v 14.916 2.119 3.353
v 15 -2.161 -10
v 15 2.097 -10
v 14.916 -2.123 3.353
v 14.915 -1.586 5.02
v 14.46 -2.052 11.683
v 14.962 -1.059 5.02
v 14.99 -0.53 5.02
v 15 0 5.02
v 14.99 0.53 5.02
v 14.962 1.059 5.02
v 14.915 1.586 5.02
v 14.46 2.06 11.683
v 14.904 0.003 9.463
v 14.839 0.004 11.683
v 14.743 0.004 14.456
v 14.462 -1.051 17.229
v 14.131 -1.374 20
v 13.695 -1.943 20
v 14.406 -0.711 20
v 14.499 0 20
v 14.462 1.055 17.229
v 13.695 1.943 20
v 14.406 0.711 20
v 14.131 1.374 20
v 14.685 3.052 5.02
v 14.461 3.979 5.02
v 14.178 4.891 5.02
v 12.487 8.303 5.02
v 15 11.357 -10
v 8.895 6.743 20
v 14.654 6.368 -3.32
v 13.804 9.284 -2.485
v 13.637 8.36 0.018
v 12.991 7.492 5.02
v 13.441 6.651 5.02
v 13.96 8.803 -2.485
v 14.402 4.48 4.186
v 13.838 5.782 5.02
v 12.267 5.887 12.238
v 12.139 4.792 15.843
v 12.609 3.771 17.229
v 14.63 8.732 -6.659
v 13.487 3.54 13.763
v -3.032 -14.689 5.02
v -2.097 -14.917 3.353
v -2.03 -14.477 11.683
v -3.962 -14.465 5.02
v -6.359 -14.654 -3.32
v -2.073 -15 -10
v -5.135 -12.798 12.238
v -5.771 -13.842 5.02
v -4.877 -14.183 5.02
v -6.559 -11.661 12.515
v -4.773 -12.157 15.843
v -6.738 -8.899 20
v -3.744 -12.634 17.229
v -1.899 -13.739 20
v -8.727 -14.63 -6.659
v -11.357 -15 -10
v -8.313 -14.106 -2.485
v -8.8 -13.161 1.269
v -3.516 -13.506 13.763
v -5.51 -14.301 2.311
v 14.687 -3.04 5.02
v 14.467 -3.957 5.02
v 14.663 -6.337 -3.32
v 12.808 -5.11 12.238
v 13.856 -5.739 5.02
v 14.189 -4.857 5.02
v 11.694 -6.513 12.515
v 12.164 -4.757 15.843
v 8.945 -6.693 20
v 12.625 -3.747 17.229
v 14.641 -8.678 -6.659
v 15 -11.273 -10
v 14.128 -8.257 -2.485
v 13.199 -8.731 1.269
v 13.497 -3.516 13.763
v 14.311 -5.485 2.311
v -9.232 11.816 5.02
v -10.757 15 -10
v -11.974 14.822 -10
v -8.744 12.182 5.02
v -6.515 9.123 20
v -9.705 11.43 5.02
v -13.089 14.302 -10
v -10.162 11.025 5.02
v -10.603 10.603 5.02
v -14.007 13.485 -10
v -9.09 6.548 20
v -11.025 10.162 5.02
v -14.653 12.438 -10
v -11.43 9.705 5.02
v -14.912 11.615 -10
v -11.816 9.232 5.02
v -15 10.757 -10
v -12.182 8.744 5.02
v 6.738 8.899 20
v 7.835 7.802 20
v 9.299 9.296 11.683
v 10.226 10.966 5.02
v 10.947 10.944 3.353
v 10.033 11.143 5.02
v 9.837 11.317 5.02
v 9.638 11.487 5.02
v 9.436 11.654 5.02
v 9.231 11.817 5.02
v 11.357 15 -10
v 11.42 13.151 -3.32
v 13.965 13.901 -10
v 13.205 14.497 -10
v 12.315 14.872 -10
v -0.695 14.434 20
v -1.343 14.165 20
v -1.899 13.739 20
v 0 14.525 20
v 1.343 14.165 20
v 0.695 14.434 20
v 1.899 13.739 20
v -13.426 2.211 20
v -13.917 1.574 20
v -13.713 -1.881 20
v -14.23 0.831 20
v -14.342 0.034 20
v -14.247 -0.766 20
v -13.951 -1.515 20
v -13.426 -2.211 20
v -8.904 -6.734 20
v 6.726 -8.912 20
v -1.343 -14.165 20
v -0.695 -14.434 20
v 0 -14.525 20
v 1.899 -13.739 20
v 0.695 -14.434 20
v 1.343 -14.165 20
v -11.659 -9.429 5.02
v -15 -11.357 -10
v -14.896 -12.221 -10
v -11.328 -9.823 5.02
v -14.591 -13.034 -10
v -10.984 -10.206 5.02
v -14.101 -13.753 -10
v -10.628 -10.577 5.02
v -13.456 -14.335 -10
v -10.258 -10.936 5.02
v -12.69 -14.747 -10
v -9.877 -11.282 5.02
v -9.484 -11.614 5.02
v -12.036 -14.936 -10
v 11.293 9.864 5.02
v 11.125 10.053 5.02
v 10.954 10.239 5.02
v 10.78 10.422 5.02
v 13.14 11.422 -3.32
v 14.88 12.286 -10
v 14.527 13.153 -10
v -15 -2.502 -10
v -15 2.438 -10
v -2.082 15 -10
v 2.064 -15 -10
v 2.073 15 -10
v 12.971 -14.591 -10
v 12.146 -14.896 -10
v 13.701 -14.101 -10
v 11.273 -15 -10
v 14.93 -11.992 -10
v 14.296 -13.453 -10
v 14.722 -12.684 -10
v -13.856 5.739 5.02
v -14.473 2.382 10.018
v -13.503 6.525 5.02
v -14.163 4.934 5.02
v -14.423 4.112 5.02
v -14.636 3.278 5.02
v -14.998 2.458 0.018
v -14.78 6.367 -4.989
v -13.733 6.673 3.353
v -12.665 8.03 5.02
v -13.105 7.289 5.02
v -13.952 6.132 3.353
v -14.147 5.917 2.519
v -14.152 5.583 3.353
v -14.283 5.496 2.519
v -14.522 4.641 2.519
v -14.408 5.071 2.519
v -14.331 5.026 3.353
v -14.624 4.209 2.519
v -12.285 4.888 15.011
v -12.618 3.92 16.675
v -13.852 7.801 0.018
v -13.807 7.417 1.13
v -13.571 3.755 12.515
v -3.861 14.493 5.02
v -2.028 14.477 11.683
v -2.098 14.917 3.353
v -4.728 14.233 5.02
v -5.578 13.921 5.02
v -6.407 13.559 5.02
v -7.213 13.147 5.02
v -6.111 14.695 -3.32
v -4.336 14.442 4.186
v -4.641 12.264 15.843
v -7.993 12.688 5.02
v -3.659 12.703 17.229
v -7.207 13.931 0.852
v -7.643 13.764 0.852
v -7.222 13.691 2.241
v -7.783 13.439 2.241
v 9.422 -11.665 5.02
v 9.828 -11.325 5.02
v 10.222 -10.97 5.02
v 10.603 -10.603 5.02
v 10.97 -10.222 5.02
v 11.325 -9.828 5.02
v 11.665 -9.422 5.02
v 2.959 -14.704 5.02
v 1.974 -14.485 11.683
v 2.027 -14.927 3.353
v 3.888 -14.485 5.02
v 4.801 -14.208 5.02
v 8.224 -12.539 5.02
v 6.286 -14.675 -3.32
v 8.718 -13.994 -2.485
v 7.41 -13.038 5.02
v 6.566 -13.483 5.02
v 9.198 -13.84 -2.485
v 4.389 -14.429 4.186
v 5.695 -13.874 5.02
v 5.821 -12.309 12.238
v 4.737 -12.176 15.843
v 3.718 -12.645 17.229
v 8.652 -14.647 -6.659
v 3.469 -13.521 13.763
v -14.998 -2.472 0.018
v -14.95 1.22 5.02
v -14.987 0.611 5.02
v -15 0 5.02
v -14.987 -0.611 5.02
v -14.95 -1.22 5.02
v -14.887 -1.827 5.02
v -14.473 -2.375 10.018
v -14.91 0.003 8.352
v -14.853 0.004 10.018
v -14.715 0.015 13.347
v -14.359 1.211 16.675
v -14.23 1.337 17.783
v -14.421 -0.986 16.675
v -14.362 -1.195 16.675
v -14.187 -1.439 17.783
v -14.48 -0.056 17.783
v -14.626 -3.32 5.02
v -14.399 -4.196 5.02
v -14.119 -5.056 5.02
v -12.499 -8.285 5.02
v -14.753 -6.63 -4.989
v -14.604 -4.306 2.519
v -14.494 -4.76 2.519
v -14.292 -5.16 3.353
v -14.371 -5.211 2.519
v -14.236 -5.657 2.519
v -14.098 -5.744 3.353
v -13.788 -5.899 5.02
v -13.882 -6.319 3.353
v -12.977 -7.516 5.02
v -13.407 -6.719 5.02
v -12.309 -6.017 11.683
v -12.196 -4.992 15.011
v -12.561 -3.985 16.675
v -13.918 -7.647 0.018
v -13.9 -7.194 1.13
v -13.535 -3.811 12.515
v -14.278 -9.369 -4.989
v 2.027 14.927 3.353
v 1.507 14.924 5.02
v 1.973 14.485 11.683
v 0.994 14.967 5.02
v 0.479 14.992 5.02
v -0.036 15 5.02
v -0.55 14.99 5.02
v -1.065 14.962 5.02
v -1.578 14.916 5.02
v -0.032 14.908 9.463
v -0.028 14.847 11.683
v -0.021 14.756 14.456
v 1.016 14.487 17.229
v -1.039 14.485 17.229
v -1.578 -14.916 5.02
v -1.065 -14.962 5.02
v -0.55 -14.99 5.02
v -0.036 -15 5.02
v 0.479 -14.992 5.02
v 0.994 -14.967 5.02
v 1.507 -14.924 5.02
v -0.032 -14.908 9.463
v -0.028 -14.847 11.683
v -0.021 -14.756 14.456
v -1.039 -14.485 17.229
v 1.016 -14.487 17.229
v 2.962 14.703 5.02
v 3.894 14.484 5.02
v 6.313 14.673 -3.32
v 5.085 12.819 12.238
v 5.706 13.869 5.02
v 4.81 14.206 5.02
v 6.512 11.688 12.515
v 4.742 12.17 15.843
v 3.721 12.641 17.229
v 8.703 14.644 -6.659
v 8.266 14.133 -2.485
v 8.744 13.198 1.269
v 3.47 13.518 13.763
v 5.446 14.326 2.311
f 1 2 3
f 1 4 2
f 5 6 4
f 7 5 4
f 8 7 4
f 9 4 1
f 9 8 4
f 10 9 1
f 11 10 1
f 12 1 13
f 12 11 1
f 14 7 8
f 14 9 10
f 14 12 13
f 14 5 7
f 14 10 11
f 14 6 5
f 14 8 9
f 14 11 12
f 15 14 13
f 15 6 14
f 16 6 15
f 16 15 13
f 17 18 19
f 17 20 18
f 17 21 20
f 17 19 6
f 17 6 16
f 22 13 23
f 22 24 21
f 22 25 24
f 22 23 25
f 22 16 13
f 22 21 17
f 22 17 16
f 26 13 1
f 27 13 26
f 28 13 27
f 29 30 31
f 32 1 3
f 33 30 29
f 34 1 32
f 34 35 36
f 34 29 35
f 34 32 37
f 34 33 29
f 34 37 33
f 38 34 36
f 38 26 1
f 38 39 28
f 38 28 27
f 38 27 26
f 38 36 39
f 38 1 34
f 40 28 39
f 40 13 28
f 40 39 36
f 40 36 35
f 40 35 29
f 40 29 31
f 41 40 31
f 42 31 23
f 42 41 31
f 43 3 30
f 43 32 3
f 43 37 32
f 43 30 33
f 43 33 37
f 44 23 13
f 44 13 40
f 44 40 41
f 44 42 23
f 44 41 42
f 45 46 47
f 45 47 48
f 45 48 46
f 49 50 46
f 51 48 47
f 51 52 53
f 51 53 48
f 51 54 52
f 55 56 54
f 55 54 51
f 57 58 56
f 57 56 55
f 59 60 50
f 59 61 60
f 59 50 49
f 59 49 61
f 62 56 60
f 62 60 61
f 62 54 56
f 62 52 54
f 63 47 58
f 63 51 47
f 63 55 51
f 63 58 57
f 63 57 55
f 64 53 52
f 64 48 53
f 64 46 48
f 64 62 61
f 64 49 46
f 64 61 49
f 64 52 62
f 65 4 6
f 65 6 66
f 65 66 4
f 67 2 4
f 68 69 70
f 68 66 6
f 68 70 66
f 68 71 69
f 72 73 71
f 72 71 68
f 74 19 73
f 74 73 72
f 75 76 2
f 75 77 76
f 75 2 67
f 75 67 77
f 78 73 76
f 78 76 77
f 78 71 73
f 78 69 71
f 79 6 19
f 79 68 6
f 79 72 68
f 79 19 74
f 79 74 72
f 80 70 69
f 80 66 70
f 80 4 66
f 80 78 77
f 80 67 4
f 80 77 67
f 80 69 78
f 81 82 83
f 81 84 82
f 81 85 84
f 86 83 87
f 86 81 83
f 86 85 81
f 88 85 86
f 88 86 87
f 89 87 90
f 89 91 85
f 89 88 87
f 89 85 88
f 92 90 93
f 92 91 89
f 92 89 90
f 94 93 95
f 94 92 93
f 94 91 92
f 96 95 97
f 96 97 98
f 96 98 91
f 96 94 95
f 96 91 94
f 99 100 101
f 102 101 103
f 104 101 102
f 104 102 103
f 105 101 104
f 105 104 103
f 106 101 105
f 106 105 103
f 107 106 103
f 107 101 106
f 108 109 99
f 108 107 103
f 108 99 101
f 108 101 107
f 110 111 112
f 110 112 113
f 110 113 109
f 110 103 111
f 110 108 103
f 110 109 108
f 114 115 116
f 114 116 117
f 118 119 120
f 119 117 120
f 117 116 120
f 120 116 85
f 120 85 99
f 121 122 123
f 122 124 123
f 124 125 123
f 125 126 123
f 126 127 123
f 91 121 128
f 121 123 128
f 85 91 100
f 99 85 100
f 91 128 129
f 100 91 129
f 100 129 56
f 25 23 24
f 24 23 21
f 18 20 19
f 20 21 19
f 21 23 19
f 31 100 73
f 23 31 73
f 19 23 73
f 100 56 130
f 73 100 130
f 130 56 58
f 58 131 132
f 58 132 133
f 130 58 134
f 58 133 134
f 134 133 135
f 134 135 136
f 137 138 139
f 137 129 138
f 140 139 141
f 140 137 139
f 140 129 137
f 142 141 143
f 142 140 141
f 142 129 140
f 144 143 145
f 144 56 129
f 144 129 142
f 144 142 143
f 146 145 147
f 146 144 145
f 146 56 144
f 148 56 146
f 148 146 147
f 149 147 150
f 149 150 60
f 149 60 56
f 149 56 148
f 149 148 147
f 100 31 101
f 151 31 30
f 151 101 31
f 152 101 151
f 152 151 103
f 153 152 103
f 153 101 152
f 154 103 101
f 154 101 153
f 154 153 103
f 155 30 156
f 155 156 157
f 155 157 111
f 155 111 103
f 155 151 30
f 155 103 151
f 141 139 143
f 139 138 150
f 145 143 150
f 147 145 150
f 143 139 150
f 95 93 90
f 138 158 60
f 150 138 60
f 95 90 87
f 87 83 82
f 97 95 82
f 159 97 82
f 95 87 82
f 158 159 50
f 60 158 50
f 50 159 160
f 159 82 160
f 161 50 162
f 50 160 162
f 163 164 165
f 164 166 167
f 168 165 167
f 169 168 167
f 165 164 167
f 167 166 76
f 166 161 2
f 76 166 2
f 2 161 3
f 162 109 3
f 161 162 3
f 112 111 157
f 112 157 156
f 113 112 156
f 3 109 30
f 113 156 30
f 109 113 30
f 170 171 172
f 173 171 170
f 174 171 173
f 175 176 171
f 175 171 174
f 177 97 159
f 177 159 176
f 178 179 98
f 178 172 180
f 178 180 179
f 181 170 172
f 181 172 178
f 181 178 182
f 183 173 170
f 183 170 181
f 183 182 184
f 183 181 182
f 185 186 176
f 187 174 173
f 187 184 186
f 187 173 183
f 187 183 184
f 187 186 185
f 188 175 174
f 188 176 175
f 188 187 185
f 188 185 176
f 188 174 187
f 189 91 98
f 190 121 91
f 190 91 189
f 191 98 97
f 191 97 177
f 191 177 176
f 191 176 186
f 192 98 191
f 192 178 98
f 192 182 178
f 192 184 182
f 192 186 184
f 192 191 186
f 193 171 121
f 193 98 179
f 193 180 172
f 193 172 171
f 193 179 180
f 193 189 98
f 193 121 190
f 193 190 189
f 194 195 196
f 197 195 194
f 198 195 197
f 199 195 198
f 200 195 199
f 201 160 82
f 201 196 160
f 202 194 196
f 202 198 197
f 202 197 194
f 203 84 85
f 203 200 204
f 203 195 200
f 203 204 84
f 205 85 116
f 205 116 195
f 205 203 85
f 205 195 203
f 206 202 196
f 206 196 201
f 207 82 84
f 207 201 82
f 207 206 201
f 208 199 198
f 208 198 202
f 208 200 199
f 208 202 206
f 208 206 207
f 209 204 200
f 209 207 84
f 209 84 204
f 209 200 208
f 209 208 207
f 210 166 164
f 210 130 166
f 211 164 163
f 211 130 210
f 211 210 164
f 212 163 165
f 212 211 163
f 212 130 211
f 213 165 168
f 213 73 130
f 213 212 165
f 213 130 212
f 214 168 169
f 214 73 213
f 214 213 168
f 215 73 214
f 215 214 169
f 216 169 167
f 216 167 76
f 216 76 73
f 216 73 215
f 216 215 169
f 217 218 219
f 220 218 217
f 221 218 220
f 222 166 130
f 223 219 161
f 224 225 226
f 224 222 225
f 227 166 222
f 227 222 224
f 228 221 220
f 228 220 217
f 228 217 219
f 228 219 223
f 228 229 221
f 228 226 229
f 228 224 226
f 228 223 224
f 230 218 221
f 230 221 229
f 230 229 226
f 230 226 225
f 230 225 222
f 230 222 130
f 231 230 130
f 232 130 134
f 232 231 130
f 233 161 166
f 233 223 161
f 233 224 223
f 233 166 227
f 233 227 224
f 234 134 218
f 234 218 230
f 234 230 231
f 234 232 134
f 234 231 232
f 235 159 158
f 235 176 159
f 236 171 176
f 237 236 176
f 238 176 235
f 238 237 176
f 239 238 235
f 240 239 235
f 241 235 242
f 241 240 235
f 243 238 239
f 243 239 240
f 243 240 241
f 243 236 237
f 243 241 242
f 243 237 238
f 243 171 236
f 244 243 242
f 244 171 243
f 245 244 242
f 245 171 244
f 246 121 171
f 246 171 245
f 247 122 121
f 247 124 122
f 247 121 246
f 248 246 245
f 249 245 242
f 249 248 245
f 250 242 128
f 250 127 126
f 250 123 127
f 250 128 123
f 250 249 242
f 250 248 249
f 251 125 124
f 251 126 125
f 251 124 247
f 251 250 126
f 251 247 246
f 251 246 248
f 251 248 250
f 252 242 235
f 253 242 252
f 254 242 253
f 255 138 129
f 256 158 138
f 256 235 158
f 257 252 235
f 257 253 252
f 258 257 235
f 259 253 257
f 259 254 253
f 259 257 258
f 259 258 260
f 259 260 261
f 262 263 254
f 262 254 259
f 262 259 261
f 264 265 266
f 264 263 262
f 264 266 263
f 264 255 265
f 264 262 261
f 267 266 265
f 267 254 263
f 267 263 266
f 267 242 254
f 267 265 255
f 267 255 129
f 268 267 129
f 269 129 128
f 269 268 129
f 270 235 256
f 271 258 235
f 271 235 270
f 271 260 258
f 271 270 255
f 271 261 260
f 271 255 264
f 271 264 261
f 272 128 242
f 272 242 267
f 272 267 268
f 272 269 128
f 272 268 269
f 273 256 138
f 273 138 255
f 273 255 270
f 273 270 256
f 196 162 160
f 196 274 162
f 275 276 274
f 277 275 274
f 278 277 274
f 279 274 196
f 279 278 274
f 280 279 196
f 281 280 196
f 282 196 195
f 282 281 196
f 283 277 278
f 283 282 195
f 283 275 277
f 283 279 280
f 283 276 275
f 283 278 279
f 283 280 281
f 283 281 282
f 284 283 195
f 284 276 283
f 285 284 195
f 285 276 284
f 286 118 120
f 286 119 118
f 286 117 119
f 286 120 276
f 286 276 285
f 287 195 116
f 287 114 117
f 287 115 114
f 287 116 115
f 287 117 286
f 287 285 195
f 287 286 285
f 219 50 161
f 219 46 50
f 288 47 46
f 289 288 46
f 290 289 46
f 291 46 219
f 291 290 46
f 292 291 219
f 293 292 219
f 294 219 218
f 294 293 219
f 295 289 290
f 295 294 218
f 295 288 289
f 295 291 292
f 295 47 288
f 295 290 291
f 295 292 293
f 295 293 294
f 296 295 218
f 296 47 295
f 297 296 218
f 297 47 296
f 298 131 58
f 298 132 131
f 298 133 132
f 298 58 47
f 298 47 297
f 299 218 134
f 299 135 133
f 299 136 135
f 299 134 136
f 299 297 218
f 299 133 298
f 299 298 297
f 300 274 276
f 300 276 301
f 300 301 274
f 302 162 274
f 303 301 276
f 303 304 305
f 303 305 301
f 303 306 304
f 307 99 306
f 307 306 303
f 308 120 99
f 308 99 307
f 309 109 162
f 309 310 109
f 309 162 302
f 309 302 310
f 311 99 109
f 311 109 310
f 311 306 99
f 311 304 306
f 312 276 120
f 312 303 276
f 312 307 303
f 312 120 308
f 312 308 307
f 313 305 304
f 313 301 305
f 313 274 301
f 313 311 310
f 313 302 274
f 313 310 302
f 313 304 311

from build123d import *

# Parameters (mm, degrees)
SKETCH002_R = 15


with BuildPart() as part:
    # Sketch → AdditiveLoft section 0
    with BuildSketch(Plane.XY.offset(-10)):
        with BuildLine():
            Line((-15, 10.757359), (-15, -11.357359))
            ThreePointArc((-15, -11.357359), (-13.933095, -13.933095), (-11.357359, -15))
            Line((-11.357359, -15), (11.272507, -15))
            ThreePointArc((11.272507, -15), (13.908243, -13.908243), (15, -11.272507))
            Line((15, -11.272507), (15, 11.357359))
            ThreePointArc((15, 11.357359), (13.933095, 13.933095), (11.357359, 15))
            Line((11.357359, 15), (-10.757359, 15))
            ThreePointArc((-10.757359, 15), (-13.757359, 13.757359), (-15, 10.757359))
        make_face()
    # Sketch002 → AdditiveLoft section 1
    with BuildSketch(Plane(origin=(0, 0, 5), x_dir=(0.707107, 0.707107, 0), z_dir=(0, 0, 1))):
        Circle(SKETCH002_R)
    # Sketch001 → AdditiveLoft section 2
    with BuildSketch(Plane(origin=(0, 0, 20), x_dir=(0.707107, 0.707107, 0), z_dir=(0, 0, 1))):
        with BuildLine():
            Line((-11.057359, 7.929866), (-11.057359, -8.37216))
            ThreePointArc((-11.057359, -8.37216), (-10.270882, -10.270882), (-8.37216, -11.057359))
            Line((-8.37216, -11.057359), (8.30961, -11.057359))
            ThreePointArc((8.30961, -11.057359), (10.252562, -10.252562), (11.057359, -8.30961))
            Line((11.057359, -8.30961), (11.057359, 8.37216))
            ThreePointArc((11.057359, 8.37216), (10.270882, 10.270882), (8.37216, 11.057359))
            Line((8.37216, 11.057359), (-7.929866, 11.057359))
            ThreePointArc((-7.929866, 11.057359), (-10.141338, 10.141338), (-11.057359, 7.929866))
        make_face()
    loft()


solid = part.part
